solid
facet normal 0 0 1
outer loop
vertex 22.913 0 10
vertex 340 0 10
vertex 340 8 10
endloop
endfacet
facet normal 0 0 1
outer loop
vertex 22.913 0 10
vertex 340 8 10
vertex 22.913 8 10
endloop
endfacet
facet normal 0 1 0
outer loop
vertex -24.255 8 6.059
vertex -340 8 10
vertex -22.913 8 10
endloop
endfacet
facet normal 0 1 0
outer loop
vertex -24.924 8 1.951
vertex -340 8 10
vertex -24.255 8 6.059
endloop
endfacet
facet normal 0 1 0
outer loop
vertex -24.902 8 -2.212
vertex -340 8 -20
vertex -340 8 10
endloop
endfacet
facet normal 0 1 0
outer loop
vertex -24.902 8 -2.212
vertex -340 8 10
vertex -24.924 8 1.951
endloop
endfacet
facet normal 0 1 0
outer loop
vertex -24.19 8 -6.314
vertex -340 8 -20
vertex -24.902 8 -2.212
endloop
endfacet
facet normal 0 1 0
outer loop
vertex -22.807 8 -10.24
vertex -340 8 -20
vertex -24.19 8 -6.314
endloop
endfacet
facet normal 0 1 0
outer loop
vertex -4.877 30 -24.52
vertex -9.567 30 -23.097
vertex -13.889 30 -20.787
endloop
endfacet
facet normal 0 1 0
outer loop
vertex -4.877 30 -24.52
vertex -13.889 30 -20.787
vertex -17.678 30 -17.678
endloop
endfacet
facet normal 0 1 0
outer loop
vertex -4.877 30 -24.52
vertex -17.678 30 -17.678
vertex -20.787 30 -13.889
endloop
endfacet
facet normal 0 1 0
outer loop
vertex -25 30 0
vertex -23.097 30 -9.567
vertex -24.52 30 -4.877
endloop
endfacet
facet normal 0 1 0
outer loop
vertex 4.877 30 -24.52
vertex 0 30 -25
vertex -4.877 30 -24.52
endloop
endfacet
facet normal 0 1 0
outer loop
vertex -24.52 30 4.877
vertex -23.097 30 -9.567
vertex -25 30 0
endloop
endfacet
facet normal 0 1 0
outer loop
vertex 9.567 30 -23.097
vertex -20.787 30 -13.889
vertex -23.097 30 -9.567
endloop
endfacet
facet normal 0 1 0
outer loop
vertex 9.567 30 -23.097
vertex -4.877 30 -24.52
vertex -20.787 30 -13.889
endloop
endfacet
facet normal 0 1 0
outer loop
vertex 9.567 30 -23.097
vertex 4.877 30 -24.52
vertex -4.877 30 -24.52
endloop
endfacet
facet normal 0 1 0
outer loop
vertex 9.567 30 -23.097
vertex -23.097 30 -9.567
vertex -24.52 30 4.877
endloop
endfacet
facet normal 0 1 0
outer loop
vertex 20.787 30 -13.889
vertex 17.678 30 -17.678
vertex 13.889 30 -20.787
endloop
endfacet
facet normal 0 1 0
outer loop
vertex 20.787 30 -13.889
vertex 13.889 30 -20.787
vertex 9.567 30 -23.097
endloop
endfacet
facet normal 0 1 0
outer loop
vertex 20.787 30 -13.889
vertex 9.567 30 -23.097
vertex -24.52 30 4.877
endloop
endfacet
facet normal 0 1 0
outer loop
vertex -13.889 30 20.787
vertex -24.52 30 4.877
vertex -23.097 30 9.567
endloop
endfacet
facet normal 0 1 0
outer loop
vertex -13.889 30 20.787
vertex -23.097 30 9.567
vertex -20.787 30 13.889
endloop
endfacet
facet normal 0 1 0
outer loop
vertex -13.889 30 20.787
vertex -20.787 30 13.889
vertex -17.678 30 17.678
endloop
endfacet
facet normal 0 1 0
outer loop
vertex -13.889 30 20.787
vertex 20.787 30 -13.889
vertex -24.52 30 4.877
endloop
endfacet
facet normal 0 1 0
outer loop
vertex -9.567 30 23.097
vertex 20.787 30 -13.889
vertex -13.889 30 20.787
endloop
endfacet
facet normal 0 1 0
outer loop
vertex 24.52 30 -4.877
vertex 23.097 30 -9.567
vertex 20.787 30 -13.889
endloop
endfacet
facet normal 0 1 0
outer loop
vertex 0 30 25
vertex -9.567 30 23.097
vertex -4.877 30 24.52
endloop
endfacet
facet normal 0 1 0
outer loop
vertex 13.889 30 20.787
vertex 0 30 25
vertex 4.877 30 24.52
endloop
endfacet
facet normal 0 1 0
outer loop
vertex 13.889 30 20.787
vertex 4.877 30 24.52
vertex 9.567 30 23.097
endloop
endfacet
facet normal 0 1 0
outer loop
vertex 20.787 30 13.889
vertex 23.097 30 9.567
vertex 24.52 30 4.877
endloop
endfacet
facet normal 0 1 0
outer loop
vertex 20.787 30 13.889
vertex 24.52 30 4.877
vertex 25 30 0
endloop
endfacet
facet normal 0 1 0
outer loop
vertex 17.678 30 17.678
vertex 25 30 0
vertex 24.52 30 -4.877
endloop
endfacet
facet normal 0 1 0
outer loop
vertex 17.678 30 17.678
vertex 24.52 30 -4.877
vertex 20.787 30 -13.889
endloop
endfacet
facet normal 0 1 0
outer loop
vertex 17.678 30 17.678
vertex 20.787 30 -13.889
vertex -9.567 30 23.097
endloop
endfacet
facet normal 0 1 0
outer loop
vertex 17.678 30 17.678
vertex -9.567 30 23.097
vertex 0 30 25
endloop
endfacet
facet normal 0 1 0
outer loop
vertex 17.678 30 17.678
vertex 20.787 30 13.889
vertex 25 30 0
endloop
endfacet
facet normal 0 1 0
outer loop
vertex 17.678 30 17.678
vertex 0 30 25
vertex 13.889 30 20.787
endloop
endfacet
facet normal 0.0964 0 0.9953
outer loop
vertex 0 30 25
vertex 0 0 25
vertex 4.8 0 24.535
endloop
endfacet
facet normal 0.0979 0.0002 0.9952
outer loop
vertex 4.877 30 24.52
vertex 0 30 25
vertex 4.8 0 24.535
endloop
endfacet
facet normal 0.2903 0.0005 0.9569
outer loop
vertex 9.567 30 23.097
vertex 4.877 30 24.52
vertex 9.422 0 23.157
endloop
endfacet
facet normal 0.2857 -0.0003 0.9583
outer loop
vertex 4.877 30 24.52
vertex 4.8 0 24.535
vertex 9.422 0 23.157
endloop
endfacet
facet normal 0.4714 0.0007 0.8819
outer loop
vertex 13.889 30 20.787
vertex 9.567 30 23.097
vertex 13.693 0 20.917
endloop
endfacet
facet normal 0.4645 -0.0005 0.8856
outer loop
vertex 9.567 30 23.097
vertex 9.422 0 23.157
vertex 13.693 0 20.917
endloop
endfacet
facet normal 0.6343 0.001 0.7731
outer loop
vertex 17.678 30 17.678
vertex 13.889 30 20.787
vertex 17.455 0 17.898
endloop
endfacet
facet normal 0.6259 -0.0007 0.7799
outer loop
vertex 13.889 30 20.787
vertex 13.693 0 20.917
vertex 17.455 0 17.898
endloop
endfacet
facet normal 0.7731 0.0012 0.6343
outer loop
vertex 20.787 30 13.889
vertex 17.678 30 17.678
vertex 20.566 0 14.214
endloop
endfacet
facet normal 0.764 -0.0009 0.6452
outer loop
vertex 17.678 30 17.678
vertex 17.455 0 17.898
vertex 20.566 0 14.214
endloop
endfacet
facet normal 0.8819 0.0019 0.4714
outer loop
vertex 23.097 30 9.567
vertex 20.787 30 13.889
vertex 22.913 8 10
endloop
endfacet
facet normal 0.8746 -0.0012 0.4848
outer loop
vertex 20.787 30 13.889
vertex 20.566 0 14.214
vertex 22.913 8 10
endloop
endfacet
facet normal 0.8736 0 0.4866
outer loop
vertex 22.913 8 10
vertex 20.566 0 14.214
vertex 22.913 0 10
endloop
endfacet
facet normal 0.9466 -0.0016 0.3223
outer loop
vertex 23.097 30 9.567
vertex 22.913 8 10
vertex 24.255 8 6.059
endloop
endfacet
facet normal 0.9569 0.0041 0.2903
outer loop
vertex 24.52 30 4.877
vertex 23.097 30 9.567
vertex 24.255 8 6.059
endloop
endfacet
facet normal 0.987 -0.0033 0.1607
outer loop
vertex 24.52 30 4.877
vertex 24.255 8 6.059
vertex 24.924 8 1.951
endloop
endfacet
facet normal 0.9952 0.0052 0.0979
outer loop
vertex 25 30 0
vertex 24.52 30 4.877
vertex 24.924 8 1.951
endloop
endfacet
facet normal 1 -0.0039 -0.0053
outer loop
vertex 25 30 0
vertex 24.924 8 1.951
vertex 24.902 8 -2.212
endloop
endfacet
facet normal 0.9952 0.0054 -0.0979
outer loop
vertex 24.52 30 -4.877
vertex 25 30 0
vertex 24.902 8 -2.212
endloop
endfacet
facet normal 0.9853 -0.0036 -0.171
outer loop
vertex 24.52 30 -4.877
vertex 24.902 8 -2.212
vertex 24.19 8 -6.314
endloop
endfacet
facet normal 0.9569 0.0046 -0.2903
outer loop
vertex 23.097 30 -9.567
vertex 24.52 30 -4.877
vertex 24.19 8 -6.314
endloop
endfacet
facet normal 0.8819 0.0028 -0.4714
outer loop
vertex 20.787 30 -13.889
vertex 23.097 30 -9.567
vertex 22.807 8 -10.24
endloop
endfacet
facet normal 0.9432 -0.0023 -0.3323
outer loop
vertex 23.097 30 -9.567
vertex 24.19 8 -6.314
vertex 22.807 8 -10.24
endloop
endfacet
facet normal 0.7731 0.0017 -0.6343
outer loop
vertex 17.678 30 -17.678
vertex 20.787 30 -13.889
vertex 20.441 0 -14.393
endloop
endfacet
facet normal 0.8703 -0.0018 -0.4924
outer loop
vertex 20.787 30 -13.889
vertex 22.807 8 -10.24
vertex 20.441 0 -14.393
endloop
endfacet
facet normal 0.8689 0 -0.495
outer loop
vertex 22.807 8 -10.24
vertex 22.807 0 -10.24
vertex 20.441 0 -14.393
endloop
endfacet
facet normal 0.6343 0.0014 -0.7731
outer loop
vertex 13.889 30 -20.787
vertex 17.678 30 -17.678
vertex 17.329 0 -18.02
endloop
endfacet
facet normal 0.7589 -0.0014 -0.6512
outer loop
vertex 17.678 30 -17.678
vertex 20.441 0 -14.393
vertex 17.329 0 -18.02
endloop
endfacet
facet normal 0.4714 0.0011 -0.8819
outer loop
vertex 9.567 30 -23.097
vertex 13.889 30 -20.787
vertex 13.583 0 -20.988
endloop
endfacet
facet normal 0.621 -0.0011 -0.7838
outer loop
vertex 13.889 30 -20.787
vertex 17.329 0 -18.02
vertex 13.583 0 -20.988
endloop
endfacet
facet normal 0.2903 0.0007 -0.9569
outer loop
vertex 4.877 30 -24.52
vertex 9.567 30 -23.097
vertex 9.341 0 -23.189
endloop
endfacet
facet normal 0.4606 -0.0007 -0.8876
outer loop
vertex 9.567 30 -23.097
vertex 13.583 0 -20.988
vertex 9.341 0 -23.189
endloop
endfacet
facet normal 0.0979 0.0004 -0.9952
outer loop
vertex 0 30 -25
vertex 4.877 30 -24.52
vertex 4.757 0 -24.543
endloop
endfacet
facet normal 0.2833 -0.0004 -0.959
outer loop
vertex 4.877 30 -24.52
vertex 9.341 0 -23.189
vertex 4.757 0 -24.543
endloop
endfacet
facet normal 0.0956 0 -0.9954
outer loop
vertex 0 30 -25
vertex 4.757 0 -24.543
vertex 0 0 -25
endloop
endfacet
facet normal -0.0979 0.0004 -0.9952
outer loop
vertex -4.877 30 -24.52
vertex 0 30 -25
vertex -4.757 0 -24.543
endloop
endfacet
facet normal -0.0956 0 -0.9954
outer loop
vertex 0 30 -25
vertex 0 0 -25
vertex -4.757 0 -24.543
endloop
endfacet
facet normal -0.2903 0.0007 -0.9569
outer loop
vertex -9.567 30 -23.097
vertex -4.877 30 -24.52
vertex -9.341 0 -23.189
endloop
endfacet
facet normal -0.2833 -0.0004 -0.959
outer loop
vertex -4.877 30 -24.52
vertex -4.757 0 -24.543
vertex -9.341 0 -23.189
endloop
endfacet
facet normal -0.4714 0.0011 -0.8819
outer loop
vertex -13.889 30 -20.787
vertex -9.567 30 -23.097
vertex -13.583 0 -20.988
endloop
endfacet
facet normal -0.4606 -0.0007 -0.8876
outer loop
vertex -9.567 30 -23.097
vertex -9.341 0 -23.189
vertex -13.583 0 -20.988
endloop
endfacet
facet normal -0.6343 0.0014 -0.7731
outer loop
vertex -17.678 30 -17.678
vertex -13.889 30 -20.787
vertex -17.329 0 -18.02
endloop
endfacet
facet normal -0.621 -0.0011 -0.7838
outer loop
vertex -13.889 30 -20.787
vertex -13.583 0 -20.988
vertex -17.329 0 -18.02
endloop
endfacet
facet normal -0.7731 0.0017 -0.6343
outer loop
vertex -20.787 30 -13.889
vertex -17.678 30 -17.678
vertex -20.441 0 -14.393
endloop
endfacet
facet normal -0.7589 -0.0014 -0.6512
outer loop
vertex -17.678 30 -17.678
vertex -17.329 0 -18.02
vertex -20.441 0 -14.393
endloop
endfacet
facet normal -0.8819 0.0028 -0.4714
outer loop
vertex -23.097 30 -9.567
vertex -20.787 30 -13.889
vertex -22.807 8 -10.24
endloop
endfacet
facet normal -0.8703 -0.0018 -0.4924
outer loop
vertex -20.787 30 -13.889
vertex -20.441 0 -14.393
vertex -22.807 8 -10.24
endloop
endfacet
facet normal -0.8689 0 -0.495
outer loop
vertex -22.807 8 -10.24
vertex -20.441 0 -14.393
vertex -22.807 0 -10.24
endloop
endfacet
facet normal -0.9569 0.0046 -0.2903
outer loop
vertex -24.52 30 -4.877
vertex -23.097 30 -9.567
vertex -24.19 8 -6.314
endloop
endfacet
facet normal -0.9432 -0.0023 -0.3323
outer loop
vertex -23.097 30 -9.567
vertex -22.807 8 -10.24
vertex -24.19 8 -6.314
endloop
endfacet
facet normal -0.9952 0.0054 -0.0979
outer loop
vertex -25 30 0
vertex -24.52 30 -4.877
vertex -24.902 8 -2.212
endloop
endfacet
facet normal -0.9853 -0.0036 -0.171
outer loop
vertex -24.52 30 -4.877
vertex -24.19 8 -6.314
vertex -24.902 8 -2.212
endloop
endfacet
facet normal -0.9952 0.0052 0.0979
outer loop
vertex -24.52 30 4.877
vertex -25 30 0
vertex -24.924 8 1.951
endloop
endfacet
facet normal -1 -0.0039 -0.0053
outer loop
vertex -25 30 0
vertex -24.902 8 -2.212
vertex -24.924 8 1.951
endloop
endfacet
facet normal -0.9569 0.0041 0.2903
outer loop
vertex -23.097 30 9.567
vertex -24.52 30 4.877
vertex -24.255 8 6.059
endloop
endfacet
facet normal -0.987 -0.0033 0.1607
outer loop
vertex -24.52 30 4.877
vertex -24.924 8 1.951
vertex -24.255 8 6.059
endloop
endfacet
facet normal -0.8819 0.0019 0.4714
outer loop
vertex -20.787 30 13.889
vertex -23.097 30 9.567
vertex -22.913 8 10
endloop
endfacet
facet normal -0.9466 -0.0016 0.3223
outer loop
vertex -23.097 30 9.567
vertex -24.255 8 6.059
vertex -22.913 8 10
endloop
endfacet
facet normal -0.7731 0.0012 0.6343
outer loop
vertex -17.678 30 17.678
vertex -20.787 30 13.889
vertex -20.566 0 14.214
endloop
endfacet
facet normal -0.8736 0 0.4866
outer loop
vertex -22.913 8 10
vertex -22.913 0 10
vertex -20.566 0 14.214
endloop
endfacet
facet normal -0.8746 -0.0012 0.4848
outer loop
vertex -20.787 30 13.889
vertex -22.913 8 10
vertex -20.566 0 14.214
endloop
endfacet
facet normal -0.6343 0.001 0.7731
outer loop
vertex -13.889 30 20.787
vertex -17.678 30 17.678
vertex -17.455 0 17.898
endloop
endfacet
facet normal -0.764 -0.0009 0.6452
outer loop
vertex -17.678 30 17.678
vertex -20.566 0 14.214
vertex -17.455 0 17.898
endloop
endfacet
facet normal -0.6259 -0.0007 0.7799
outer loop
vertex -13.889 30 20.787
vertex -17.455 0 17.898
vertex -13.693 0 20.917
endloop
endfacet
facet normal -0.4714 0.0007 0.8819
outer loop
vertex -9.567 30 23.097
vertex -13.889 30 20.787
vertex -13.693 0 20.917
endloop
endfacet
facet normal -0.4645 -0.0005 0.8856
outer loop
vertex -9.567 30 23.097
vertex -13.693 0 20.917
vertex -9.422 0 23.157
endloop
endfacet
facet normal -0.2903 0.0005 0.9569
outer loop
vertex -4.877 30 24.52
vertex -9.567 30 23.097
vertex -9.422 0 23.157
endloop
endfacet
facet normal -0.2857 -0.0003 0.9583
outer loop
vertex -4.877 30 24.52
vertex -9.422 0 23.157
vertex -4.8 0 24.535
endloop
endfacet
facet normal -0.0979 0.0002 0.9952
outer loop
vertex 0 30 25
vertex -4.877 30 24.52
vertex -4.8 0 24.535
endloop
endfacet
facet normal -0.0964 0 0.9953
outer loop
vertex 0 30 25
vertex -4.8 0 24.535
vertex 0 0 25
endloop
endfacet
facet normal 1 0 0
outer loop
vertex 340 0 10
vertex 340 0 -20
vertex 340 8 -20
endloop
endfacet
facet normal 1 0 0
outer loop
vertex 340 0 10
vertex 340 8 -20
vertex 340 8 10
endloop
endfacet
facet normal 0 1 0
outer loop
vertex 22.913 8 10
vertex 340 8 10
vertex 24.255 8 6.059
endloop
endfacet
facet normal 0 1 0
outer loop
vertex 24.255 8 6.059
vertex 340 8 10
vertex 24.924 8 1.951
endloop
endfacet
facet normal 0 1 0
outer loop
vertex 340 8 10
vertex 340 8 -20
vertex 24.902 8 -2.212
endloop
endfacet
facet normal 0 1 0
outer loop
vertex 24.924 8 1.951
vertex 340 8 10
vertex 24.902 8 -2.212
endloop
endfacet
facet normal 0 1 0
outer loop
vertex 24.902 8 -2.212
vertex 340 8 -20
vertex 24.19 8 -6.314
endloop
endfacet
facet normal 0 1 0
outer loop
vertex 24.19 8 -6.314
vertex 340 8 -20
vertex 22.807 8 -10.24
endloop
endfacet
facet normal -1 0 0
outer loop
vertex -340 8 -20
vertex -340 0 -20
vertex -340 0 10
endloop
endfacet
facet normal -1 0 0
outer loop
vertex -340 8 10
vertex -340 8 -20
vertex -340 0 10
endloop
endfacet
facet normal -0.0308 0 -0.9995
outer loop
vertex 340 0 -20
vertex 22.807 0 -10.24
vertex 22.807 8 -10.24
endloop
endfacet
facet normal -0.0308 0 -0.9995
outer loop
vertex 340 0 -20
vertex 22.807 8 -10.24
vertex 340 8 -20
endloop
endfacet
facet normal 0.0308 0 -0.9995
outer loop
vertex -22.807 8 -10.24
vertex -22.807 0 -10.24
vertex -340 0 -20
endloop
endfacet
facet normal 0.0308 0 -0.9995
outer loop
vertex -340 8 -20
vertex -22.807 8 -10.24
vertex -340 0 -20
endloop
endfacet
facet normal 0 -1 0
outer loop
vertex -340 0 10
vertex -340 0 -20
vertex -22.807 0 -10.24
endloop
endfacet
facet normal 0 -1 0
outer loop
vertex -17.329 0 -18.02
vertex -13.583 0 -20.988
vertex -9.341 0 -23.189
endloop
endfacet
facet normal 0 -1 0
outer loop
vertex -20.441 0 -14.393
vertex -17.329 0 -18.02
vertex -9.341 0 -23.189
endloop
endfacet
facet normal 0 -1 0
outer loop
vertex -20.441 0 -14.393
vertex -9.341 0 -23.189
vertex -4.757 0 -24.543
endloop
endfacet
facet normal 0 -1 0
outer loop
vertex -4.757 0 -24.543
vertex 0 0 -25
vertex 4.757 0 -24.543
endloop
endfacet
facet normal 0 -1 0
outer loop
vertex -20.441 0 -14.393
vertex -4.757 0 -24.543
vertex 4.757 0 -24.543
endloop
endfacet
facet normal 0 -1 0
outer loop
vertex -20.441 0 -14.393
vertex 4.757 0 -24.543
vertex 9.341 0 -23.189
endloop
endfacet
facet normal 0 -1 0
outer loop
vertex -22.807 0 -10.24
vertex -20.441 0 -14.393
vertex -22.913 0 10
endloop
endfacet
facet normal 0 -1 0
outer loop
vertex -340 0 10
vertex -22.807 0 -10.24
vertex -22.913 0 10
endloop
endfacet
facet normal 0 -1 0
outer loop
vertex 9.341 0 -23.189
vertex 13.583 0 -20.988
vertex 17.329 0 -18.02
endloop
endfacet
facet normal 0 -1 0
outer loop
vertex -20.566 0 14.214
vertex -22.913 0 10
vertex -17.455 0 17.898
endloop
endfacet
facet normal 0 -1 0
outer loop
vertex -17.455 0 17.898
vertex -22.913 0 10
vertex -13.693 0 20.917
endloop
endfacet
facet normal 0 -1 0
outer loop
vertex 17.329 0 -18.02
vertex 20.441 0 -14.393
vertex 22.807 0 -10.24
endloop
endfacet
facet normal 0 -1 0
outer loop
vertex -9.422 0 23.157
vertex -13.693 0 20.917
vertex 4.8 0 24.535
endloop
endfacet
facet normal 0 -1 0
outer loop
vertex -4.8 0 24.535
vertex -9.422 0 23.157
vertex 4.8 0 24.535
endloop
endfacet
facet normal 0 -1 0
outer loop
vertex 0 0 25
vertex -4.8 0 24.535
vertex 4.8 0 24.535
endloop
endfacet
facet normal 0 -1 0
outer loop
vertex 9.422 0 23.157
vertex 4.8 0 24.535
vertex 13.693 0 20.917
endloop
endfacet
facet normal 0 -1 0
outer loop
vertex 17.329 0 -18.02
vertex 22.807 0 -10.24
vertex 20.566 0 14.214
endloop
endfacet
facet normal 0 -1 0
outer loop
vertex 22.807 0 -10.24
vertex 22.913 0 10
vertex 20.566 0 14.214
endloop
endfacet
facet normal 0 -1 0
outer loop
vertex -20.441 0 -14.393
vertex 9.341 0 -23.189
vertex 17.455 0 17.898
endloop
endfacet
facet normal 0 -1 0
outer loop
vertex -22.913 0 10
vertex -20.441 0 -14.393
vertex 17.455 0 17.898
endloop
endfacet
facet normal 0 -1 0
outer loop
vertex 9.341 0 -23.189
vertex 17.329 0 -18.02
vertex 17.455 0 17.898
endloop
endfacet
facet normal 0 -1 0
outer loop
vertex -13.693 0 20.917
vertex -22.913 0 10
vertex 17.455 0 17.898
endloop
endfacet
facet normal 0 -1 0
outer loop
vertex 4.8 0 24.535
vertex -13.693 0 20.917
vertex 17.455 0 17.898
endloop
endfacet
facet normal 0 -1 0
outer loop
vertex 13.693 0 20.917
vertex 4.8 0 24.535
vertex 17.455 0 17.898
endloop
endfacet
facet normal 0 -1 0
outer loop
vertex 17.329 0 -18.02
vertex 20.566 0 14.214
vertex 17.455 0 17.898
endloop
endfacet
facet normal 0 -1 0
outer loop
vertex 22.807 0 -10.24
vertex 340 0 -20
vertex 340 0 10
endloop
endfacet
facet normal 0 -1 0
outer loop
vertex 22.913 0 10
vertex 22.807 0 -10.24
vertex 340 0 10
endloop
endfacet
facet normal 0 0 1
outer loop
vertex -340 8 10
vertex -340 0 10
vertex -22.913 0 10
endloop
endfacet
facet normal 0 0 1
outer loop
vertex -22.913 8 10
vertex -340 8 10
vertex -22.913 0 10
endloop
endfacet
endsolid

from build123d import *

# Parameters (mm, degrees)
SKETCH1_R           = 25
BOSS_EXTRUDE1_DEPTH = 30
BOSS_EXTRUDE2_DEPTH = 8


with BuildPart() as part:
    # Sketch1 → Boss-Extrude1 (new body)
    with BuildSketch(Plane(origin=(0, 0, 0), x_dir=(1, 0, 0), z_dir=(0, 1, 0))):
        with Locations(Location((0, 0, 0), (0, 0, 270))):
            Circle(SKETCH1_R)
    extrude(amount=BOSS_EXTRUDE1_DEPTH)

    # Sketch2 → Boss-Extrude2 (add)
    with BuildSketch(Plane(origin=(0, 0, 0), x_dir=(1, 0, 0), z_dir=(0, 1, 0))):
        Polygon((15, 10), (340, 20), (340, -10), (15, -10), align=None)
        Polygon((-15, 10), (-340, 20), (-340, -10), (-15, -10), align=None)
    extrude(amount=BOSS_EXTRUDE2_DEPTH)


solid = part.part
